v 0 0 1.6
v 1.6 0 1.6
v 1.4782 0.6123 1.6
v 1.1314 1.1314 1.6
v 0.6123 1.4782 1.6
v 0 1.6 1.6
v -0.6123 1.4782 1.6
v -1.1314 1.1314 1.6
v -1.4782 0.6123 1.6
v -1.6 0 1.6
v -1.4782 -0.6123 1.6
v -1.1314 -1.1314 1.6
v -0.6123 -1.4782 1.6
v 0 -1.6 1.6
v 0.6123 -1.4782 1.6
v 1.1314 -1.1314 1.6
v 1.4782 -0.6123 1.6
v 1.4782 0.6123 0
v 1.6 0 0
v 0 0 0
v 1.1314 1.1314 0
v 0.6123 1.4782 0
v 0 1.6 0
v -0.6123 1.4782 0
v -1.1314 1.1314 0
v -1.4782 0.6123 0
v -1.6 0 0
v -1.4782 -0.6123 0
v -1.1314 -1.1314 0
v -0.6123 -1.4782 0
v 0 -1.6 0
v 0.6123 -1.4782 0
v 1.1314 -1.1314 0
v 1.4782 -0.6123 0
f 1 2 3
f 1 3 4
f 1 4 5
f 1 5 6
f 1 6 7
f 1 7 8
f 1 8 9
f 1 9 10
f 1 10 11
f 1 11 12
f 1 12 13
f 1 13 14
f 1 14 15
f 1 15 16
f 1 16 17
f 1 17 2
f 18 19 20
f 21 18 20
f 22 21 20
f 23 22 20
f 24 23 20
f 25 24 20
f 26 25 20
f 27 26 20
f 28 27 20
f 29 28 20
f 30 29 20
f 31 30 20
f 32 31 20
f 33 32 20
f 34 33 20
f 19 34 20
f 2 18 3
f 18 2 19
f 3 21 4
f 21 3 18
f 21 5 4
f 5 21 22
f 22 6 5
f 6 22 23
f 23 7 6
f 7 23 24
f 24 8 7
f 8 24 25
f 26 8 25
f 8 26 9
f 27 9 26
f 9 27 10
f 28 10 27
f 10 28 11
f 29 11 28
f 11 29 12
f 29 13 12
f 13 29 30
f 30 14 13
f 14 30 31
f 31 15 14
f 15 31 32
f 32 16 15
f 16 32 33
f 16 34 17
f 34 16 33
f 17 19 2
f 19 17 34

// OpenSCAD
// file: 4-4edge.scad
use <../lib.scad>
function ldraw_lib__4_4edge() = [
// 0 Circle 1.0
// 0 Name: 4-4edge.dat
// 0 Author: James Jessiman
// 0 !LDRAW_ORG Primitive UPDATE 2017-01
// 0 !LICENSE Licensed under CC BY 4.0 : see CAreadme.txt
// 
// 0 BFC CERTIFY CCW
  [0,"BFC","CERTIFY"],
  [0,"BFC","CCW"],
// 
// 0 !HISTORY 1998-12-15 [PTadmin] Official Update 1998-10
// 0 !HISTORY 2005-12-28 [PTadmin] Official Update 2005-01
// 0 !HISTORY 2007-06-24 [PTadmin] Header formatted for Contributor Agreement
// 0 !HISTORY 2008-07-01 [PTadmin] Official Update 2008-01
// 0 !HISTORY 2017-01-15 [Steffen] BFCed
// 0 !HISTORY 2017-12-30 [PTadmin] Official Update 2017-01
// 
// 
// 2 24 1 0 0 0.9239 0 0.3827
  [2,24,1,0,0,0.9239,0,0.3827],
// 2 24 0.9239 0 0.3827 0.7071 0 0.7071
  [2,24,0.9239,0,0.3827,0.7071,0,0.7071],
// 2 24 0.7071 0 0.7071 0.3827 0 0.9239
  [2,24,0.7071,0,0.7071,0.3827,0,0.9239],
// 2 24 0.3827 0 0.9239 0 0 1
  [2,24,0.3827,0,0.9239,0,0,1],
// 2 24 0 0 1 -0.3827 0 0.9239
  [2,24,0,0,1,-0.3827,0,0.9239],
// 2 24 -0.3827 0 0.9239 -0.7071 0 0.7071
  [2,24,-0.3827,0,0.9239,-0.7071,0,0.7071],
// 2 24 -0.7071 0 0.7071 -0.9239 0 0.3827
  [2,24,-0.7071,0,0.7071,-0.9239,0,0.3827],
// 2 24 -0.9239 0 0.3827 -1 0 -0
  [2,24,-0.9239,0,0.3827,-1,0,-0],
// 2 24 -1 0 -0 -0.9239 0 -0.3827
  [2,24,-1,0,-0,-0.9239,0,-0.3827],
// 2 24 -0.9239 0 -0.3827 -0.7071 0 -0.7071
  [2,24,-0.9239,0,-0.3827,-0.7071,0,-0.7071],
// 2 24 -0.7071 0 -0.7071 -0.3827 0 -0.9239
  [2,24,-0.7071,0,-0.7071,-0.3827,0,-0.9239],
// 2 24 -0.3827 0 -0.9239 0 0 -1
  [2,24,-0.3827,0,-0.9239,0,0,-1],
// 2 24 0 0 -1 0.3827 0 -0.9239
  [2,24,0,0,-1,0.3827,0,-0.9239],
// 2 24 0.3827 0 -0.9239 0.7071 0 -0.7071
  [2,24,0.3827,0,-0.9239,0.7071,0,-0.7071],
// 2 24 0.7071 0 -0.7071 0.9239 0 -0.3827
  [2,24,0.7071,0,-0.7071,0.9239,0,-0.3827],
// 2 24 0.9239 0 -0.3827 1 0 0
  [2,24,0.9239,0,-0.3827,1,0,0],
];
module ldraw_lib__4_4edge(step=0, col=false, unit=2/5, alt=false, line=0.2, solid=!$preview)
    makepoly(ldraw_lib__4_4edge(), step=step, col=col, unit=unit, alt=alt, line=line, solid=solid);
ldraw_lib__4_4edge(line=0.2);
// file: 4-4disc.scad
use <../lib.scad>
function ldraw_lib__4_4disc() = [
// 0 Disc 1.0
// 0 Name: 4-4disc.dat
// 0 Author: James Jessiman
// 0 !LDRAW_ORG Primitive UPDATE 2002-02
// 0 !LICENSE Licensed under CC BY 4.0 : see CAreadme.txt
// 
// 0 BFC CERTIFY CCW
  [0,"BFC","CERTIFY"],
  [0,"BFC","CCW"],
// 
// 0 !HISTORY 1998-12-15 [PTadmin] Official Update 1998-10
// 0 !HISTORY 2002-03-23 [sbliss] Added BFC statement
// 0 !HISTORY 2002-04-25 [PTadmin] Official Update 2002-02
// 0 !HISTORY 2007-06-24 [PTadmin] Header formatted for Contributor Agreement
// 0 !HISTORY 2008-07-01 [PTadmin] Official Update 2008-01
// 
// 
// 3 16 0 0 0 1 0 0 0.9239 0 0.3827
  [3,16,0,0,0,1,0,0,0.9239,0,0.3827],
// 3 16 0 0 0 0.9239 0 0.3827 0.7071 0 0.7071
  [3,16,0,0,0,0.9239,0,0.3827,0.7071,0,0.7071],
// 3 16 0 0 0 0.7071 0 0.7071 0.3827 0 0.9239
  [3,16,0,0,0,0.7071,0,0.7071,0.3827,0,0.9239],
// 3 16 0 0 0 0.3827 0 0.9239 0 0 1
  [3,16,0,0,0,0.3827,0,0.9239,0,0,1],
// 3 16 0 0 0 0 0 1 -0.3827 0 0.9239
  [3,16,0,0,0,0,0,1,-0.3827,0,0.9239],
// 3 16 0 0 0 -0.3827 0 0.9239 -0.7071 0 0.7071
  [3,16,0,0,0,-0.3827,0,0.9239,-0.7071,0,0.7071],
// 3 16 0 0 0 -0.7071 0 0.7071 -0.9239 0 0.3827
  [3,16,0,0,0,-0.7071,0,0.7071,-0.9239,0,0.3827],
// 3 16 0 0 0 -0.9239 0 0.3827 -1 0 -0
  [3,16,0,0,0,-0.9239,0,0.3827,-1,0,-0],
// 3 16 0 0 0 -1 0 -0 -0.9239 0 -0.3827
  [3,16,0,0,0,-1,0,-0,-0.9239,0,-0.3827],
// 3 16 0 0 0 -0.9239 0 -0.3827 -0.7071 0 -0.7071
  [3,16,0,0,0,-0.9239,0,-0.3827,-0.7071,0,-0.7071],
// 3 16 0 0 0 -0.7071 0 -0.7071 -0.3827 0 -0.9239
  [3,16,0,0,0,-0.7071,0,-0.7071,-0.3827,0,-0.9239],
// 3 16 0 0 0 -0.3827 0 -0.9239 0 0 -1
  [3,16,0,0,0,-0.3827,0,-0.9239,0,0,-1],
// 3 16 0 0 0 0 0 -1 0.3827 0 -0.9239
  [3,16,0,0,0,0,0,-1,0.3827,0,-0.9239],
// 3 16 0 0 0 0.3827 0 -0.9239 0.7071 0 -0.7071
  [3,16,0,0,0,0.3827,0,-0.9239,0.7071,0,-0.7071],
// 3 16 0 0 0 0.7071 0 -0.7071 0.9239 0 -0.3827
  [3,16,0,0,0,0.7071,0,-0.7071,0.9239,0,-0.3827],
// 3 16 0 0 0 0.9239 0 -0.3827 1 0 0
  [3,16,0,0,0,0.9239,0,-0.3827,1,0,0],
// 0
];
module ldraw_lib__4_4disc(step=0, col=false, unit=2/5, alt=false, line=0.2, solid=!$preview)
    makepoly(ldraw_lib__4_4disc(), step=step, col=col, unit=unit, alt=alt, line=line, solid=solid);
ldraw_lib__4_4disc(line=0.2);
// file: 4-4cyli.scad
use <../lib.scad>
function ldraw_lib__4_4cyli() = [
// 0 Cylinder 1.0
// 0 Name: 4-4cyli.dat
// 0 Author: James Jessiman
// 0 !LDRAW_ORG Primitive UPDATE 2005-01
// 0 !LICENSE Licensed under CC BY 4.0 : see CAreadme.txt
// 
// 0 BFC CERTIFY CCW
  [0,"BFC","CERTIFY"],
  [0,"BFC","CCW"],
// 
// 0 !HISTORY 1998-12-15 [PTadmin] Official Update 1998-10
// 0 !HISTORY 2002-03-23 [sbliss] Added BFC statement; merged headers from files in distributions LDraw 0.27 and Complete.
// 0 !HISTORY 2002-04-25 [PTadmin] Official Update 2002-02
// 0 !HISTORY 2004-12-14 [guyvivan] BFC CCW
// 0 !HISTORY 2005-12-28 [PTadmin] Official Update 2005-01
// 0 !HISTORY 2007-06-24 [PTadmin] Header formatted for Contributor Agreement
// 0 !HISTORY 2008-07-01 [PTadmin] Official Update 2008-01
// 
// 
// 4 16 1 1 0 0.9239 1 0.3827 0.9239 0 0.3827 1 0 0
  [4,16,1,1,0,0.9239,1,0.3827,0.9239,0,0.3827,1,0,0],
// 5 24 1 0 0 1 1 0 0.9239 0 0.3827 0.9239 0 -0.3827
  [5,24,1,0,0,1,1,0,0.9239,0,0.3827,0.9239,0,-0.3827],
// 4 16 0.9239 1 0.3827 0.7071 1 0.7071 0.7071 0 0.7071 0.9239 0 0.3827
  [4,16,0.9239,1,0.3827,0.7071,1,0.7071,0.7071,0,0.7071,0.9239,0,0.3827],
// 5 24 0.9239 0 0.3827 0.9239 1 0.3827 0.7071 0 0.7071 1 0 0
  [5,24,0.9239,0,0.3827,0.9239,1,0.3827,0.7071,0,0.7071,1,0,0],
// 4 16 0.7071 1 0.7071 0.3827 1 0.9239 0.3827 0 0.9239 0.7071 0 0.7071
  [4,16,0.7071,1,0.7071,0.3827,1,0.9239,0.3827,0,0.9239,0.7071,0,0.7071],
// 5 24 0.7071 0 0.7071 0.7071 1 0.7071 0.3827 0 0.9239 0.9239 0 0.3827
  [5,24,0.7071,0,0.7071,0.7071,1,0.7071,0.3827,0,0.9239,0.9239,0,0.3827],
// 4 16 0.3827 1 0.9239 0 1 1 0 0 1 0.3827 0 0.9239
  [4,16,0.3827,1,0.9239,0,1,1,0,0,1,0.3827,0,0.9239],
// 5 24 0.3827 0 0.9239 0.3827 1 0.9239 0 0 1 0.7071 0 0.7071
  [5,24,0.3827,0,0.9239,0.3827,1,0.9239,0,0,1,0.7071,0,0.7071],
// 4 16 0 1 1 -0.3827 1 0.9239 -0.3827 0 0.9239 0 0 1
  [4,16,0,1,1,-0.3827,1,0.9239,-0.3827,0,0.9239,0,0,1],
// 5 24 0 0 1 0 1 1 -0.3827 0 0.9239 0.3827 0 0.9239
  [5,24,0,0,1,0,1,1,-0.3827,0,0.9239,0.3827,0,0.9239],
// 4 16 -0.3827 1 0.9239 -0.7071 1 0.7071 -0.7071 0 0.7071 -0.3827 0 0.9239
  [4,16,-0.3827,1,0.9239,-0.7071,1,0.7071,-0.7071,0,0.7071,-0.3827,0,0.9239],
// 5 24 -0.3827 0 0.9239 -0.3827 1 0.9239 -0.7071 0 0.7071 0 0 1
  [5,24,-0.3827,0,0.9239,-0.3827,1,0.9239,-0.7071,0,0.7071,0,0,1],
// 4 16 -0.7071 1 0.7071 -0.9239 1 0.3827 -0.9239 0 0.3827 -0.7071 0 0.7071
  [4,16,-0.7071,1,0.7071,-0.9239,1,0.3827,-0.9239,0,0.3827,-0.7071,0,0.7071],
// 5 24 -0.7071 0 0.7071 -0.7071 1 0.7071 -0.9239 0 0.3827 -0.3827 0 0.9239
  [5,24,-0.7071,0,0.7071,-0.7071,1,0.7071,-0.9239,0,0.3827,-0.3827,0,0.9239],
// 4 16 -0.9239 1 0.3827 -1 1 0 -1 0 0 -0.9239 0 0.3827
  [4,16,-0.9239,1,0.3827,-1,1,0,-1,0,0,-0.9239,0,0.3827],
// 5 24 -0.9239 0 0.3827 -0.9239 1 0.3827 -1 0 0 -0.7071 0 0.7071
  [5,24,-0.9239,0,0.3827,-0.9239,1,0.3827,-1,0,0,-0.7071,0,0.7071],
// 4 16 -1 1 0 -0.9239 1 -0.3827 -0.9239 0 -0.3827 -1 0 0
  [4,16,-1,1,0,-0.9239,1,-0.3827,-0.9239,0,-0.3827,-1,0,0],
// 5 24 -1 0 0 -1 1 0 -0.9239 0 -0.3827 -0.9239 0 0.3827
  [5,24,-1,0,0,-1,1,0,-0.9239,0,-0.3827,-0.9239,0,0.3827],
// 4 16 -0.9239 1 -0.3827 -0.7071 1 -0.7071 -0.7071 0 -0.7071 -0.9239 0 -0.3827
  [4,16,-0.9239,1,-0.3827,-0.7071,1,-0.7071,-0.7071,0,-0.7071,-0.9239,0,-0.3827],
// 5 24 -0.9239 0 -0.3827 -0.9239 1 -0.3827 -0.7071 0 -0.7071 -1 0 0
  [5,24,-0.9239,0,-0.3827,-0.9239,1,-0.3827,-0.7071,0,-0.7071,-1,0,0],
// 4 16 -0.7071 1 -0.7071 -0.3827 1 -0.9239 -0.3827 0 -0.9239 -0.7071 0 -0.7071
  [4,16,-0.7071,1,-0.7071,-0.3827,1,-0.9239,-0.3827,0,-0.9239,-0.7071,0,-0.7071],
// 5 24 -0.7071 0 -0.7071 -0.7071 1 -0.7071 -0.3827 0 -0.9239 -0.9239 0 -0.3827
  [5,24,-0.7071,0,-0.7071,-0.7071,1,-0.7071,-0.3827,0,-0.9239,-0.9239,0,-0.3827],
// 4 16 -0.3827 1 -0.9239 0 1 -1 0 0 -1 -0.3827 0 -0.9239
  [4,16,-0.3827,1,-0.9239,0,1,-1,0,0,-1,-0.3827,0,-0.9239],
// 5 24 -0.3827 0 -0.9239 -0.3827 1 -0.9239 0 0 -1 -0.7071 0 -0.7071
  [5,24,-0.3827,0,-0.9239,-0.3827,1,-0.9239,0,0,-1,-0.7071,0,-0.7071],
// 4 16 0 1 -1 0.3827 1 -0.9239 0.3827 0 -0.9239 0 0 -1
  [4,16,0,1,-1,0.3827,1,-0.9239,0.3827,0,-0.9239,0,0,-1],
// 5 24 0 0 -1 0 1 -1 0.3827 0 -0.9239 -0.3827 0 -0.9239
  [5,24,0,0,-1,0,1,-1,0.3827,0,-0.9239,-0.3827,0,-0.9239],
// 4 16 0.3827 1 -0.9239 0.7071 1 -0.7071 0.7071 0 -0.7071 0.3827 0 -0.9239
  [4,16,0.3827,1,-0.9239,0.7071,1,-0.7071,0.7071,0,-0.7071,0.3827,0,-0.9239],
// 5 24 0.3827 0 -0.9239 0.3827 1 -0.9239 0.7071 0 -0.7071 0 0 -1
  [5,24,0.3827,0,-0.9239,0.3827,1,-0.9239,0.7071,0,-0.7071,0,0,-1],
// 4 16 0.7071 1 -0.7071 0.9239 1 -0.3827 0.9239 0 -0.3827 0.7071 0 -0.7071
  [4,16,0.7071,1,-0.7071,0.9239,1,-0.3827,0.9239,0,-0.3827,0.7071,0,-0.7071],
// 5 24 0.7071 0 -0.7071 0.7071 1 -0.7071 0.9239 0 -0.3827 0.3827 0 -0.9239
  [5,24,0.7071,0,-0.7071,0.7071,1,-0.7071,0.9239,0,-0.3827,0.3827,0,-0.9239],
// 4 16 0.9239 1 -0.3827 1 1 0 1 0 0 0.9239 0 -0.3827
  [4,16,0.9239,1,-0.3827,1,1,0,1,0,0,0.9239,0,-0.3827],
// 5 24 0.9239 0 -0.3827 0.9239 1 -0.3827 1 0 0 0.7071 0 -0.7071
  [5,24,0.9239,0,-0.3827,0.9239,1,-0.3827,1,0,0,0.7071,0,-0.7071],
// 0
];
module ldraw_lib__4_4cyli(step=0, col=false, unit=2/5, alt=false, line=0.2, solid=!$preview)
    makepoly(ldraw_lib__4_4cyli(), step=step, col=col, unit=unit, alt=alt, line=line, solid=solid);
ldraw_lib__4_4cyli(line=0.2);
// main file
use <../lib.scad>
use <4-4cyli.scad>
use <4-4disc.scad>
use <4-4edge.scad>
function ldraw_lib__stud3() = [
// 0 Stud Tube Solid
// 0 Name: stud3.dat
// 0 Author: James Jessiman
// 0 !LDRAW_ORG Primitive UPDATE 2012-01
// 0 !LICENSE Licensed under CC BY 4.0 : see CAreadme.txt
// 
// 0 BFC CERTIFY CCW
  [0,"BFC","CERTIFY"],
  [0,"BFC","CCW"],
// 
// 0 !HISTORY 2002-04-04 [sbliss] Modified for BFC compliance
// 0 !HISTORY 2002-04-25 [PTadmin] Official Update 2002-02
// 0 !HISTORY 2007-06-24 [PTadmin] Header formatted for Contributor Agreement
// 0 !HISTORY 2008-07-01 [PTadmin] Official Update 2008-01
// 0 !HISTORY 2012-02-16 [Philo] Changed to CCW
// 0 !HISTORY 2012-03-30 [PTadmin] Official Update 2012-01
// 
// 
// 1 16 0 -4 0 4 0 0 0 1 0 0 0 4 4-4edge.dat
  [1,16,0,-4,0,4,0,0,0,1,0,0,0,4, ldraw_lib__4_4edge()],
// 1 16 0 0 0 4 0 0 0 1 0 0 0 4 4-4edge.dat
  [1,16,0,0,0,4,0,0,0,1,0,0,0,4, ldraw_lib__4_4edge()],
// 1 16 0 -4 0 4 0 0 0 1 0 0 0 4 4-4disc.dat
  [1,16,0,-4,0,4,0,0,0,1,0,0,0,4, ldraw_lib__4_4disc()],
  [-1,16,0,0,0,4,0,0,0,-1,0,0,0,4, ldraw_lib__4_4disc()],
// 1 16 0 -4 0 4 0 0 0 4 0 0 0 4 4-4cyli.dat
  [1,16,0,-4,0,4,0,0,0,4,0,0,0,4, ldraw_lib__4_4cyli()],
];
module ldraw_lib__stud3(step=0, col=false, unit=2/5, alt=false, line=0.2, solid=!$preview)
    makepoly(ldraw_lib__stud3(), step=step, col=col, unit=unit, alt=alt, line=line, solid=solid);
ldraw_lib__stud3(line=0.2);
